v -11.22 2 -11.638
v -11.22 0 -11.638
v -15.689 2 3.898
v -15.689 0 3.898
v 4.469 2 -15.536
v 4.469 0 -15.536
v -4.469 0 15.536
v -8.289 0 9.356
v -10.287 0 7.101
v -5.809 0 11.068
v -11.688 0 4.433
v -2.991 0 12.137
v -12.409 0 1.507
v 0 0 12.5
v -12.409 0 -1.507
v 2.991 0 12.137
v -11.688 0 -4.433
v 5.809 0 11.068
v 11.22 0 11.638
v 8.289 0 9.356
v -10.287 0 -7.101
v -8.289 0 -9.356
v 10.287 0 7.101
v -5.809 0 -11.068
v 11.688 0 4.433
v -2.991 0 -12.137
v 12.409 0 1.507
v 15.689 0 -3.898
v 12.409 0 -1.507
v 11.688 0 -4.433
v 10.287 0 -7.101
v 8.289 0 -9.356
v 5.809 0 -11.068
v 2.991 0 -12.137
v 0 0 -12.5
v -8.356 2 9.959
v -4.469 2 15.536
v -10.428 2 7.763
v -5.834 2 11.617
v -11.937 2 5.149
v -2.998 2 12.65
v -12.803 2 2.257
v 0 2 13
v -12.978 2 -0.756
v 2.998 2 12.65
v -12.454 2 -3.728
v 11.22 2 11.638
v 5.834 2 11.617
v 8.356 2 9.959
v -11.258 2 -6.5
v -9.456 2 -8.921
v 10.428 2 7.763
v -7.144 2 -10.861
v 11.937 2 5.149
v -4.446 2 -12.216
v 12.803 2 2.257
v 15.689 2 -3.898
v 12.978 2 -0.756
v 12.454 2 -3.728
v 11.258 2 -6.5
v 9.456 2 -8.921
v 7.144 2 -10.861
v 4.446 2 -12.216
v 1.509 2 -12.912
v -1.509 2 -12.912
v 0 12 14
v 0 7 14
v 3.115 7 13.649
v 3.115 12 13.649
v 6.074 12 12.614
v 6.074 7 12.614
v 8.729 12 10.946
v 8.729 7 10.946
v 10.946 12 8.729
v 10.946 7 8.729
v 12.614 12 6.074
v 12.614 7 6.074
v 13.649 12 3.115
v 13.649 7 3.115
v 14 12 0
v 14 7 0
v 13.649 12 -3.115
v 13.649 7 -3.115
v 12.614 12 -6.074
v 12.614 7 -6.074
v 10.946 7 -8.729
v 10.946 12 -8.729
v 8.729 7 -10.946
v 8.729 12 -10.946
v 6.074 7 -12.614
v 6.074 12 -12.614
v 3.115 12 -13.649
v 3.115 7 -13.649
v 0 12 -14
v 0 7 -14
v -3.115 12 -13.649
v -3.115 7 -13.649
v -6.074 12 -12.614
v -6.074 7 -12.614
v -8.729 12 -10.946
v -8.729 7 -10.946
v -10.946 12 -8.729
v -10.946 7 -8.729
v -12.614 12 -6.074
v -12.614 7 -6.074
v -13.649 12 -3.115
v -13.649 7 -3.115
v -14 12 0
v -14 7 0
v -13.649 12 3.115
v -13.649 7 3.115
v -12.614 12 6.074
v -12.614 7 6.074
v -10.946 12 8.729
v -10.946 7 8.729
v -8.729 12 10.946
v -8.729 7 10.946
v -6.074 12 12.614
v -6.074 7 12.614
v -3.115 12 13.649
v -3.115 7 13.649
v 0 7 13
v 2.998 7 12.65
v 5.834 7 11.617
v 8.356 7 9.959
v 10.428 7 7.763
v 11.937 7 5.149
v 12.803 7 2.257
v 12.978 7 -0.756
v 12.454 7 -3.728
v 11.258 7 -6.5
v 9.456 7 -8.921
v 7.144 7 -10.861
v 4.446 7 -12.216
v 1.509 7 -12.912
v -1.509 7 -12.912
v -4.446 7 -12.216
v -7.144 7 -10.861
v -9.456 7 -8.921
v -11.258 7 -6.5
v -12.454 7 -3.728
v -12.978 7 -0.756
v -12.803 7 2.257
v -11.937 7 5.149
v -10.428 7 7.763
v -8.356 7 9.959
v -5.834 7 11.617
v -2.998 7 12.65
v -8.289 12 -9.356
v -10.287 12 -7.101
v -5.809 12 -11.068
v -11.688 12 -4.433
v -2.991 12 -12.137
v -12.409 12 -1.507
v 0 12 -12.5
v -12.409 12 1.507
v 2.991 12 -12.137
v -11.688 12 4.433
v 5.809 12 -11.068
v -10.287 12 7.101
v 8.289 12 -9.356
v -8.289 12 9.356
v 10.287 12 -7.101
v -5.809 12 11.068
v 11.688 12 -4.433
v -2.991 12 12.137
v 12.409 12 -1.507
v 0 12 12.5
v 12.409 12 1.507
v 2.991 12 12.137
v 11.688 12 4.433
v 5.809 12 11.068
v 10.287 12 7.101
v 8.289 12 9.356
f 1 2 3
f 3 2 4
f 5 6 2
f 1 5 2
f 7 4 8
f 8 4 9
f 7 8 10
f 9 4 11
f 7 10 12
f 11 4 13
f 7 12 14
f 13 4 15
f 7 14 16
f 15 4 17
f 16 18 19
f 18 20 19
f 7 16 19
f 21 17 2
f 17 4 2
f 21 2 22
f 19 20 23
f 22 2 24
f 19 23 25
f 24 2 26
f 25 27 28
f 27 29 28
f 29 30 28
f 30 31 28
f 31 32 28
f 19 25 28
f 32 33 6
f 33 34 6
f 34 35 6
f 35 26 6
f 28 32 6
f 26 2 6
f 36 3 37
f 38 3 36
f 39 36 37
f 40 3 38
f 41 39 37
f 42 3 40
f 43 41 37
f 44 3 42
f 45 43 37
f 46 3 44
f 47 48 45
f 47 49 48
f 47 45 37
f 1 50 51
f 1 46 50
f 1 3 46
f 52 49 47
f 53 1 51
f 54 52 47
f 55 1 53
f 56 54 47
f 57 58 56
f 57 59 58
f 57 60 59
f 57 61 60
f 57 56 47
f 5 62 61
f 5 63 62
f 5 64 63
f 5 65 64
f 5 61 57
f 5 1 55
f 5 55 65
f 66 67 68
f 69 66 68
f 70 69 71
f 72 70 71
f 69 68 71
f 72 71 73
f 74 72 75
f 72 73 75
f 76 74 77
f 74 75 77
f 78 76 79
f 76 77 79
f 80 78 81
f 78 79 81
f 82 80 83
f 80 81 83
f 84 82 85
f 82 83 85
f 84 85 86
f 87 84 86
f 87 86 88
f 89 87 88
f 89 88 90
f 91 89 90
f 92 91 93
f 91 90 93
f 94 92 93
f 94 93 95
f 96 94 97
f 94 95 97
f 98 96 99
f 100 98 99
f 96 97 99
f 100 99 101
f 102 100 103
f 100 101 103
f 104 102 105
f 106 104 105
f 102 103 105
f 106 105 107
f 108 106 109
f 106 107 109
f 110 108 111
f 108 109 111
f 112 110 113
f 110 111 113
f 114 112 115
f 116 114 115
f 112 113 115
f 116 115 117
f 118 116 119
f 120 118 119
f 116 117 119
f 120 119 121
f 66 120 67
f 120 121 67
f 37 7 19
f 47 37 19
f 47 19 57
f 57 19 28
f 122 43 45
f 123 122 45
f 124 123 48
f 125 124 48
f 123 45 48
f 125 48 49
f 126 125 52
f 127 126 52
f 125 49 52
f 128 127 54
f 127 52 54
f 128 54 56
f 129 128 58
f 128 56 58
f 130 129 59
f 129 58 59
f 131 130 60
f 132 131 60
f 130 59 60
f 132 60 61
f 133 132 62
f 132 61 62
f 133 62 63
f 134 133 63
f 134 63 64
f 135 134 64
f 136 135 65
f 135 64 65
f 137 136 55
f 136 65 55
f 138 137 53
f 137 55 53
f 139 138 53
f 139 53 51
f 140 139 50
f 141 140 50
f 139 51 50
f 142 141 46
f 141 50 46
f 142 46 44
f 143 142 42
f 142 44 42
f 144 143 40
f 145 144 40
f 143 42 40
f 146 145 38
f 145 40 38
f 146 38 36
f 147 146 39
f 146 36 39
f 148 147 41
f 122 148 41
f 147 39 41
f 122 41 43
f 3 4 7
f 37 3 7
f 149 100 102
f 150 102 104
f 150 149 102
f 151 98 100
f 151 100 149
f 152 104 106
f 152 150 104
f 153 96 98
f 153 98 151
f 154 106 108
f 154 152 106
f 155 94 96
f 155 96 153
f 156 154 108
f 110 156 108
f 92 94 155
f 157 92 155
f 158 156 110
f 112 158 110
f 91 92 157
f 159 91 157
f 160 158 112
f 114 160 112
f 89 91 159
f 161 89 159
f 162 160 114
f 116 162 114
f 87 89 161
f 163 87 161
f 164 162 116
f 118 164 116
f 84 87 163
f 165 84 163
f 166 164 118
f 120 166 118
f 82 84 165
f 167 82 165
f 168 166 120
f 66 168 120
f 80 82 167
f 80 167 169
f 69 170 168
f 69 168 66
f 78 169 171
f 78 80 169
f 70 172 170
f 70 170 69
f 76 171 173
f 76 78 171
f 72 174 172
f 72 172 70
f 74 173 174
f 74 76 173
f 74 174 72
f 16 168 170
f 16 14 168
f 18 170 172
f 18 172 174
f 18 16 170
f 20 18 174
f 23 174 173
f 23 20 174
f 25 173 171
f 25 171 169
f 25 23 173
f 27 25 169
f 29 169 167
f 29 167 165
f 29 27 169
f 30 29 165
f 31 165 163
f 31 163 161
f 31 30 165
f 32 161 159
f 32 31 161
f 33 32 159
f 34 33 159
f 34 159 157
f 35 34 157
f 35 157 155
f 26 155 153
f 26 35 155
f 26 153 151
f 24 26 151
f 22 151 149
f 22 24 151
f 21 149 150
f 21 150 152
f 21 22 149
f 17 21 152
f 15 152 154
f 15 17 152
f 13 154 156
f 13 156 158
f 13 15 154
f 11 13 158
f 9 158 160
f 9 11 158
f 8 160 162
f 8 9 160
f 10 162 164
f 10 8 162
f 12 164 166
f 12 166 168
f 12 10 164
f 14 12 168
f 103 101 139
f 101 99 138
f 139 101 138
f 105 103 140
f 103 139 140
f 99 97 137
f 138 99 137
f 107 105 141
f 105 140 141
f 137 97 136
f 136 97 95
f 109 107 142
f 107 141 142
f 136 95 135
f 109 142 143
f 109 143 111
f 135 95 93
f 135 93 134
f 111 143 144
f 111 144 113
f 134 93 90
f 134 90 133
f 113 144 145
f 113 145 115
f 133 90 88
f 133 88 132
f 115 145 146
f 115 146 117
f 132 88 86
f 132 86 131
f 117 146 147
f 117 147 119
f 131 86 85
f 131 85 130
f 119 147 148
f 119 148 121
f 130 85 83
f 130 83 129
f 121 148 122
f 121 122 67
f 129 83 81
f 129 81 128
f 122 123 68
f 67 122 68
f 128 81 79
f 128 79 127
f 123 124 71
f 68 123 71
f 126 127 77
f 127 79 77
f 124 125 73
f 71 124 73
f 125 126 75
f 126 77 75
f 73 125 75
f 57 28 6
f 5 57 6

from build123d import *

# Parameters (mm, degrees)
SKETCH_1_R      = 12.5
EXTRUDE_1_DEPTH = 2
SKETCH_2_R      = 13
SKETCH_2_R_2    = 12.5
EXTRUDE_2_DEPTH = 5
SKETCH_3_R      = 14
SKETCH_3_R_2    = 12.5
EXTRUDE_3_DEPTH = 5


with BuildPart() as part:
    # 草圖1 → 填料-伸長1 (new body)
    with BuildSketch(Plane(origin=(0, 0, 0), x_dir=(1, 0, 0), z_dir=(0, 1, 0))):
        Polygon((-4.468973219, -15.535817059), (11.219925632, -11.638152866), (15.688898852, 3.897664193), (4.468973219, 15.535817059), (-11.219925632, 11.638152866), (-15.688898852, -3.897664193), align=None)
        with Locations(Location((0, 0, 0), (0, 0, 270))):
            Circle(SKETCH_1_R, mode=Mode.SUBTRACT)
    extrude(amount=EXTRUDE_1_DEPTH)

    # 草圖2 → 填料-伸長2 (add)
    with BuildSketch(Plane(origin=(0, 2, 0), x_dir=(1, 0, 0), z_dir=(0, 1, 0))):
        with Locations(Location((0, 0, 0), (0, 0, 270))):
            Circle(SKETCH_2_R)
        with Locations(Location((0, 0, 0), (0, 0, 270))):
            Circle(SKETCH_2_R_2, mode=Mode.SUBTRACT)
    extrude(amount=EXTRUDE_2_DEPTH)

    # 草圖3 → 填料-伸長3 (add)
    with BuildSketch(Plane(origin=(0, 7, 0), x_dir=(1, 0, 0), z_dir=(0, 1, 0))):
        with Locations(Location((0, 0, 0), (0, 0, 270))):
            Circle(SKETCH_3_R)
        with Locations(Location((0, 0, 0), (0, 0, 270))):
            Circle(SKETCH_3_R_2, mode=Mode.SUBTRACT)
    extrude(amount=EXTRUDE_3_DEPTH)


solid = part.part
